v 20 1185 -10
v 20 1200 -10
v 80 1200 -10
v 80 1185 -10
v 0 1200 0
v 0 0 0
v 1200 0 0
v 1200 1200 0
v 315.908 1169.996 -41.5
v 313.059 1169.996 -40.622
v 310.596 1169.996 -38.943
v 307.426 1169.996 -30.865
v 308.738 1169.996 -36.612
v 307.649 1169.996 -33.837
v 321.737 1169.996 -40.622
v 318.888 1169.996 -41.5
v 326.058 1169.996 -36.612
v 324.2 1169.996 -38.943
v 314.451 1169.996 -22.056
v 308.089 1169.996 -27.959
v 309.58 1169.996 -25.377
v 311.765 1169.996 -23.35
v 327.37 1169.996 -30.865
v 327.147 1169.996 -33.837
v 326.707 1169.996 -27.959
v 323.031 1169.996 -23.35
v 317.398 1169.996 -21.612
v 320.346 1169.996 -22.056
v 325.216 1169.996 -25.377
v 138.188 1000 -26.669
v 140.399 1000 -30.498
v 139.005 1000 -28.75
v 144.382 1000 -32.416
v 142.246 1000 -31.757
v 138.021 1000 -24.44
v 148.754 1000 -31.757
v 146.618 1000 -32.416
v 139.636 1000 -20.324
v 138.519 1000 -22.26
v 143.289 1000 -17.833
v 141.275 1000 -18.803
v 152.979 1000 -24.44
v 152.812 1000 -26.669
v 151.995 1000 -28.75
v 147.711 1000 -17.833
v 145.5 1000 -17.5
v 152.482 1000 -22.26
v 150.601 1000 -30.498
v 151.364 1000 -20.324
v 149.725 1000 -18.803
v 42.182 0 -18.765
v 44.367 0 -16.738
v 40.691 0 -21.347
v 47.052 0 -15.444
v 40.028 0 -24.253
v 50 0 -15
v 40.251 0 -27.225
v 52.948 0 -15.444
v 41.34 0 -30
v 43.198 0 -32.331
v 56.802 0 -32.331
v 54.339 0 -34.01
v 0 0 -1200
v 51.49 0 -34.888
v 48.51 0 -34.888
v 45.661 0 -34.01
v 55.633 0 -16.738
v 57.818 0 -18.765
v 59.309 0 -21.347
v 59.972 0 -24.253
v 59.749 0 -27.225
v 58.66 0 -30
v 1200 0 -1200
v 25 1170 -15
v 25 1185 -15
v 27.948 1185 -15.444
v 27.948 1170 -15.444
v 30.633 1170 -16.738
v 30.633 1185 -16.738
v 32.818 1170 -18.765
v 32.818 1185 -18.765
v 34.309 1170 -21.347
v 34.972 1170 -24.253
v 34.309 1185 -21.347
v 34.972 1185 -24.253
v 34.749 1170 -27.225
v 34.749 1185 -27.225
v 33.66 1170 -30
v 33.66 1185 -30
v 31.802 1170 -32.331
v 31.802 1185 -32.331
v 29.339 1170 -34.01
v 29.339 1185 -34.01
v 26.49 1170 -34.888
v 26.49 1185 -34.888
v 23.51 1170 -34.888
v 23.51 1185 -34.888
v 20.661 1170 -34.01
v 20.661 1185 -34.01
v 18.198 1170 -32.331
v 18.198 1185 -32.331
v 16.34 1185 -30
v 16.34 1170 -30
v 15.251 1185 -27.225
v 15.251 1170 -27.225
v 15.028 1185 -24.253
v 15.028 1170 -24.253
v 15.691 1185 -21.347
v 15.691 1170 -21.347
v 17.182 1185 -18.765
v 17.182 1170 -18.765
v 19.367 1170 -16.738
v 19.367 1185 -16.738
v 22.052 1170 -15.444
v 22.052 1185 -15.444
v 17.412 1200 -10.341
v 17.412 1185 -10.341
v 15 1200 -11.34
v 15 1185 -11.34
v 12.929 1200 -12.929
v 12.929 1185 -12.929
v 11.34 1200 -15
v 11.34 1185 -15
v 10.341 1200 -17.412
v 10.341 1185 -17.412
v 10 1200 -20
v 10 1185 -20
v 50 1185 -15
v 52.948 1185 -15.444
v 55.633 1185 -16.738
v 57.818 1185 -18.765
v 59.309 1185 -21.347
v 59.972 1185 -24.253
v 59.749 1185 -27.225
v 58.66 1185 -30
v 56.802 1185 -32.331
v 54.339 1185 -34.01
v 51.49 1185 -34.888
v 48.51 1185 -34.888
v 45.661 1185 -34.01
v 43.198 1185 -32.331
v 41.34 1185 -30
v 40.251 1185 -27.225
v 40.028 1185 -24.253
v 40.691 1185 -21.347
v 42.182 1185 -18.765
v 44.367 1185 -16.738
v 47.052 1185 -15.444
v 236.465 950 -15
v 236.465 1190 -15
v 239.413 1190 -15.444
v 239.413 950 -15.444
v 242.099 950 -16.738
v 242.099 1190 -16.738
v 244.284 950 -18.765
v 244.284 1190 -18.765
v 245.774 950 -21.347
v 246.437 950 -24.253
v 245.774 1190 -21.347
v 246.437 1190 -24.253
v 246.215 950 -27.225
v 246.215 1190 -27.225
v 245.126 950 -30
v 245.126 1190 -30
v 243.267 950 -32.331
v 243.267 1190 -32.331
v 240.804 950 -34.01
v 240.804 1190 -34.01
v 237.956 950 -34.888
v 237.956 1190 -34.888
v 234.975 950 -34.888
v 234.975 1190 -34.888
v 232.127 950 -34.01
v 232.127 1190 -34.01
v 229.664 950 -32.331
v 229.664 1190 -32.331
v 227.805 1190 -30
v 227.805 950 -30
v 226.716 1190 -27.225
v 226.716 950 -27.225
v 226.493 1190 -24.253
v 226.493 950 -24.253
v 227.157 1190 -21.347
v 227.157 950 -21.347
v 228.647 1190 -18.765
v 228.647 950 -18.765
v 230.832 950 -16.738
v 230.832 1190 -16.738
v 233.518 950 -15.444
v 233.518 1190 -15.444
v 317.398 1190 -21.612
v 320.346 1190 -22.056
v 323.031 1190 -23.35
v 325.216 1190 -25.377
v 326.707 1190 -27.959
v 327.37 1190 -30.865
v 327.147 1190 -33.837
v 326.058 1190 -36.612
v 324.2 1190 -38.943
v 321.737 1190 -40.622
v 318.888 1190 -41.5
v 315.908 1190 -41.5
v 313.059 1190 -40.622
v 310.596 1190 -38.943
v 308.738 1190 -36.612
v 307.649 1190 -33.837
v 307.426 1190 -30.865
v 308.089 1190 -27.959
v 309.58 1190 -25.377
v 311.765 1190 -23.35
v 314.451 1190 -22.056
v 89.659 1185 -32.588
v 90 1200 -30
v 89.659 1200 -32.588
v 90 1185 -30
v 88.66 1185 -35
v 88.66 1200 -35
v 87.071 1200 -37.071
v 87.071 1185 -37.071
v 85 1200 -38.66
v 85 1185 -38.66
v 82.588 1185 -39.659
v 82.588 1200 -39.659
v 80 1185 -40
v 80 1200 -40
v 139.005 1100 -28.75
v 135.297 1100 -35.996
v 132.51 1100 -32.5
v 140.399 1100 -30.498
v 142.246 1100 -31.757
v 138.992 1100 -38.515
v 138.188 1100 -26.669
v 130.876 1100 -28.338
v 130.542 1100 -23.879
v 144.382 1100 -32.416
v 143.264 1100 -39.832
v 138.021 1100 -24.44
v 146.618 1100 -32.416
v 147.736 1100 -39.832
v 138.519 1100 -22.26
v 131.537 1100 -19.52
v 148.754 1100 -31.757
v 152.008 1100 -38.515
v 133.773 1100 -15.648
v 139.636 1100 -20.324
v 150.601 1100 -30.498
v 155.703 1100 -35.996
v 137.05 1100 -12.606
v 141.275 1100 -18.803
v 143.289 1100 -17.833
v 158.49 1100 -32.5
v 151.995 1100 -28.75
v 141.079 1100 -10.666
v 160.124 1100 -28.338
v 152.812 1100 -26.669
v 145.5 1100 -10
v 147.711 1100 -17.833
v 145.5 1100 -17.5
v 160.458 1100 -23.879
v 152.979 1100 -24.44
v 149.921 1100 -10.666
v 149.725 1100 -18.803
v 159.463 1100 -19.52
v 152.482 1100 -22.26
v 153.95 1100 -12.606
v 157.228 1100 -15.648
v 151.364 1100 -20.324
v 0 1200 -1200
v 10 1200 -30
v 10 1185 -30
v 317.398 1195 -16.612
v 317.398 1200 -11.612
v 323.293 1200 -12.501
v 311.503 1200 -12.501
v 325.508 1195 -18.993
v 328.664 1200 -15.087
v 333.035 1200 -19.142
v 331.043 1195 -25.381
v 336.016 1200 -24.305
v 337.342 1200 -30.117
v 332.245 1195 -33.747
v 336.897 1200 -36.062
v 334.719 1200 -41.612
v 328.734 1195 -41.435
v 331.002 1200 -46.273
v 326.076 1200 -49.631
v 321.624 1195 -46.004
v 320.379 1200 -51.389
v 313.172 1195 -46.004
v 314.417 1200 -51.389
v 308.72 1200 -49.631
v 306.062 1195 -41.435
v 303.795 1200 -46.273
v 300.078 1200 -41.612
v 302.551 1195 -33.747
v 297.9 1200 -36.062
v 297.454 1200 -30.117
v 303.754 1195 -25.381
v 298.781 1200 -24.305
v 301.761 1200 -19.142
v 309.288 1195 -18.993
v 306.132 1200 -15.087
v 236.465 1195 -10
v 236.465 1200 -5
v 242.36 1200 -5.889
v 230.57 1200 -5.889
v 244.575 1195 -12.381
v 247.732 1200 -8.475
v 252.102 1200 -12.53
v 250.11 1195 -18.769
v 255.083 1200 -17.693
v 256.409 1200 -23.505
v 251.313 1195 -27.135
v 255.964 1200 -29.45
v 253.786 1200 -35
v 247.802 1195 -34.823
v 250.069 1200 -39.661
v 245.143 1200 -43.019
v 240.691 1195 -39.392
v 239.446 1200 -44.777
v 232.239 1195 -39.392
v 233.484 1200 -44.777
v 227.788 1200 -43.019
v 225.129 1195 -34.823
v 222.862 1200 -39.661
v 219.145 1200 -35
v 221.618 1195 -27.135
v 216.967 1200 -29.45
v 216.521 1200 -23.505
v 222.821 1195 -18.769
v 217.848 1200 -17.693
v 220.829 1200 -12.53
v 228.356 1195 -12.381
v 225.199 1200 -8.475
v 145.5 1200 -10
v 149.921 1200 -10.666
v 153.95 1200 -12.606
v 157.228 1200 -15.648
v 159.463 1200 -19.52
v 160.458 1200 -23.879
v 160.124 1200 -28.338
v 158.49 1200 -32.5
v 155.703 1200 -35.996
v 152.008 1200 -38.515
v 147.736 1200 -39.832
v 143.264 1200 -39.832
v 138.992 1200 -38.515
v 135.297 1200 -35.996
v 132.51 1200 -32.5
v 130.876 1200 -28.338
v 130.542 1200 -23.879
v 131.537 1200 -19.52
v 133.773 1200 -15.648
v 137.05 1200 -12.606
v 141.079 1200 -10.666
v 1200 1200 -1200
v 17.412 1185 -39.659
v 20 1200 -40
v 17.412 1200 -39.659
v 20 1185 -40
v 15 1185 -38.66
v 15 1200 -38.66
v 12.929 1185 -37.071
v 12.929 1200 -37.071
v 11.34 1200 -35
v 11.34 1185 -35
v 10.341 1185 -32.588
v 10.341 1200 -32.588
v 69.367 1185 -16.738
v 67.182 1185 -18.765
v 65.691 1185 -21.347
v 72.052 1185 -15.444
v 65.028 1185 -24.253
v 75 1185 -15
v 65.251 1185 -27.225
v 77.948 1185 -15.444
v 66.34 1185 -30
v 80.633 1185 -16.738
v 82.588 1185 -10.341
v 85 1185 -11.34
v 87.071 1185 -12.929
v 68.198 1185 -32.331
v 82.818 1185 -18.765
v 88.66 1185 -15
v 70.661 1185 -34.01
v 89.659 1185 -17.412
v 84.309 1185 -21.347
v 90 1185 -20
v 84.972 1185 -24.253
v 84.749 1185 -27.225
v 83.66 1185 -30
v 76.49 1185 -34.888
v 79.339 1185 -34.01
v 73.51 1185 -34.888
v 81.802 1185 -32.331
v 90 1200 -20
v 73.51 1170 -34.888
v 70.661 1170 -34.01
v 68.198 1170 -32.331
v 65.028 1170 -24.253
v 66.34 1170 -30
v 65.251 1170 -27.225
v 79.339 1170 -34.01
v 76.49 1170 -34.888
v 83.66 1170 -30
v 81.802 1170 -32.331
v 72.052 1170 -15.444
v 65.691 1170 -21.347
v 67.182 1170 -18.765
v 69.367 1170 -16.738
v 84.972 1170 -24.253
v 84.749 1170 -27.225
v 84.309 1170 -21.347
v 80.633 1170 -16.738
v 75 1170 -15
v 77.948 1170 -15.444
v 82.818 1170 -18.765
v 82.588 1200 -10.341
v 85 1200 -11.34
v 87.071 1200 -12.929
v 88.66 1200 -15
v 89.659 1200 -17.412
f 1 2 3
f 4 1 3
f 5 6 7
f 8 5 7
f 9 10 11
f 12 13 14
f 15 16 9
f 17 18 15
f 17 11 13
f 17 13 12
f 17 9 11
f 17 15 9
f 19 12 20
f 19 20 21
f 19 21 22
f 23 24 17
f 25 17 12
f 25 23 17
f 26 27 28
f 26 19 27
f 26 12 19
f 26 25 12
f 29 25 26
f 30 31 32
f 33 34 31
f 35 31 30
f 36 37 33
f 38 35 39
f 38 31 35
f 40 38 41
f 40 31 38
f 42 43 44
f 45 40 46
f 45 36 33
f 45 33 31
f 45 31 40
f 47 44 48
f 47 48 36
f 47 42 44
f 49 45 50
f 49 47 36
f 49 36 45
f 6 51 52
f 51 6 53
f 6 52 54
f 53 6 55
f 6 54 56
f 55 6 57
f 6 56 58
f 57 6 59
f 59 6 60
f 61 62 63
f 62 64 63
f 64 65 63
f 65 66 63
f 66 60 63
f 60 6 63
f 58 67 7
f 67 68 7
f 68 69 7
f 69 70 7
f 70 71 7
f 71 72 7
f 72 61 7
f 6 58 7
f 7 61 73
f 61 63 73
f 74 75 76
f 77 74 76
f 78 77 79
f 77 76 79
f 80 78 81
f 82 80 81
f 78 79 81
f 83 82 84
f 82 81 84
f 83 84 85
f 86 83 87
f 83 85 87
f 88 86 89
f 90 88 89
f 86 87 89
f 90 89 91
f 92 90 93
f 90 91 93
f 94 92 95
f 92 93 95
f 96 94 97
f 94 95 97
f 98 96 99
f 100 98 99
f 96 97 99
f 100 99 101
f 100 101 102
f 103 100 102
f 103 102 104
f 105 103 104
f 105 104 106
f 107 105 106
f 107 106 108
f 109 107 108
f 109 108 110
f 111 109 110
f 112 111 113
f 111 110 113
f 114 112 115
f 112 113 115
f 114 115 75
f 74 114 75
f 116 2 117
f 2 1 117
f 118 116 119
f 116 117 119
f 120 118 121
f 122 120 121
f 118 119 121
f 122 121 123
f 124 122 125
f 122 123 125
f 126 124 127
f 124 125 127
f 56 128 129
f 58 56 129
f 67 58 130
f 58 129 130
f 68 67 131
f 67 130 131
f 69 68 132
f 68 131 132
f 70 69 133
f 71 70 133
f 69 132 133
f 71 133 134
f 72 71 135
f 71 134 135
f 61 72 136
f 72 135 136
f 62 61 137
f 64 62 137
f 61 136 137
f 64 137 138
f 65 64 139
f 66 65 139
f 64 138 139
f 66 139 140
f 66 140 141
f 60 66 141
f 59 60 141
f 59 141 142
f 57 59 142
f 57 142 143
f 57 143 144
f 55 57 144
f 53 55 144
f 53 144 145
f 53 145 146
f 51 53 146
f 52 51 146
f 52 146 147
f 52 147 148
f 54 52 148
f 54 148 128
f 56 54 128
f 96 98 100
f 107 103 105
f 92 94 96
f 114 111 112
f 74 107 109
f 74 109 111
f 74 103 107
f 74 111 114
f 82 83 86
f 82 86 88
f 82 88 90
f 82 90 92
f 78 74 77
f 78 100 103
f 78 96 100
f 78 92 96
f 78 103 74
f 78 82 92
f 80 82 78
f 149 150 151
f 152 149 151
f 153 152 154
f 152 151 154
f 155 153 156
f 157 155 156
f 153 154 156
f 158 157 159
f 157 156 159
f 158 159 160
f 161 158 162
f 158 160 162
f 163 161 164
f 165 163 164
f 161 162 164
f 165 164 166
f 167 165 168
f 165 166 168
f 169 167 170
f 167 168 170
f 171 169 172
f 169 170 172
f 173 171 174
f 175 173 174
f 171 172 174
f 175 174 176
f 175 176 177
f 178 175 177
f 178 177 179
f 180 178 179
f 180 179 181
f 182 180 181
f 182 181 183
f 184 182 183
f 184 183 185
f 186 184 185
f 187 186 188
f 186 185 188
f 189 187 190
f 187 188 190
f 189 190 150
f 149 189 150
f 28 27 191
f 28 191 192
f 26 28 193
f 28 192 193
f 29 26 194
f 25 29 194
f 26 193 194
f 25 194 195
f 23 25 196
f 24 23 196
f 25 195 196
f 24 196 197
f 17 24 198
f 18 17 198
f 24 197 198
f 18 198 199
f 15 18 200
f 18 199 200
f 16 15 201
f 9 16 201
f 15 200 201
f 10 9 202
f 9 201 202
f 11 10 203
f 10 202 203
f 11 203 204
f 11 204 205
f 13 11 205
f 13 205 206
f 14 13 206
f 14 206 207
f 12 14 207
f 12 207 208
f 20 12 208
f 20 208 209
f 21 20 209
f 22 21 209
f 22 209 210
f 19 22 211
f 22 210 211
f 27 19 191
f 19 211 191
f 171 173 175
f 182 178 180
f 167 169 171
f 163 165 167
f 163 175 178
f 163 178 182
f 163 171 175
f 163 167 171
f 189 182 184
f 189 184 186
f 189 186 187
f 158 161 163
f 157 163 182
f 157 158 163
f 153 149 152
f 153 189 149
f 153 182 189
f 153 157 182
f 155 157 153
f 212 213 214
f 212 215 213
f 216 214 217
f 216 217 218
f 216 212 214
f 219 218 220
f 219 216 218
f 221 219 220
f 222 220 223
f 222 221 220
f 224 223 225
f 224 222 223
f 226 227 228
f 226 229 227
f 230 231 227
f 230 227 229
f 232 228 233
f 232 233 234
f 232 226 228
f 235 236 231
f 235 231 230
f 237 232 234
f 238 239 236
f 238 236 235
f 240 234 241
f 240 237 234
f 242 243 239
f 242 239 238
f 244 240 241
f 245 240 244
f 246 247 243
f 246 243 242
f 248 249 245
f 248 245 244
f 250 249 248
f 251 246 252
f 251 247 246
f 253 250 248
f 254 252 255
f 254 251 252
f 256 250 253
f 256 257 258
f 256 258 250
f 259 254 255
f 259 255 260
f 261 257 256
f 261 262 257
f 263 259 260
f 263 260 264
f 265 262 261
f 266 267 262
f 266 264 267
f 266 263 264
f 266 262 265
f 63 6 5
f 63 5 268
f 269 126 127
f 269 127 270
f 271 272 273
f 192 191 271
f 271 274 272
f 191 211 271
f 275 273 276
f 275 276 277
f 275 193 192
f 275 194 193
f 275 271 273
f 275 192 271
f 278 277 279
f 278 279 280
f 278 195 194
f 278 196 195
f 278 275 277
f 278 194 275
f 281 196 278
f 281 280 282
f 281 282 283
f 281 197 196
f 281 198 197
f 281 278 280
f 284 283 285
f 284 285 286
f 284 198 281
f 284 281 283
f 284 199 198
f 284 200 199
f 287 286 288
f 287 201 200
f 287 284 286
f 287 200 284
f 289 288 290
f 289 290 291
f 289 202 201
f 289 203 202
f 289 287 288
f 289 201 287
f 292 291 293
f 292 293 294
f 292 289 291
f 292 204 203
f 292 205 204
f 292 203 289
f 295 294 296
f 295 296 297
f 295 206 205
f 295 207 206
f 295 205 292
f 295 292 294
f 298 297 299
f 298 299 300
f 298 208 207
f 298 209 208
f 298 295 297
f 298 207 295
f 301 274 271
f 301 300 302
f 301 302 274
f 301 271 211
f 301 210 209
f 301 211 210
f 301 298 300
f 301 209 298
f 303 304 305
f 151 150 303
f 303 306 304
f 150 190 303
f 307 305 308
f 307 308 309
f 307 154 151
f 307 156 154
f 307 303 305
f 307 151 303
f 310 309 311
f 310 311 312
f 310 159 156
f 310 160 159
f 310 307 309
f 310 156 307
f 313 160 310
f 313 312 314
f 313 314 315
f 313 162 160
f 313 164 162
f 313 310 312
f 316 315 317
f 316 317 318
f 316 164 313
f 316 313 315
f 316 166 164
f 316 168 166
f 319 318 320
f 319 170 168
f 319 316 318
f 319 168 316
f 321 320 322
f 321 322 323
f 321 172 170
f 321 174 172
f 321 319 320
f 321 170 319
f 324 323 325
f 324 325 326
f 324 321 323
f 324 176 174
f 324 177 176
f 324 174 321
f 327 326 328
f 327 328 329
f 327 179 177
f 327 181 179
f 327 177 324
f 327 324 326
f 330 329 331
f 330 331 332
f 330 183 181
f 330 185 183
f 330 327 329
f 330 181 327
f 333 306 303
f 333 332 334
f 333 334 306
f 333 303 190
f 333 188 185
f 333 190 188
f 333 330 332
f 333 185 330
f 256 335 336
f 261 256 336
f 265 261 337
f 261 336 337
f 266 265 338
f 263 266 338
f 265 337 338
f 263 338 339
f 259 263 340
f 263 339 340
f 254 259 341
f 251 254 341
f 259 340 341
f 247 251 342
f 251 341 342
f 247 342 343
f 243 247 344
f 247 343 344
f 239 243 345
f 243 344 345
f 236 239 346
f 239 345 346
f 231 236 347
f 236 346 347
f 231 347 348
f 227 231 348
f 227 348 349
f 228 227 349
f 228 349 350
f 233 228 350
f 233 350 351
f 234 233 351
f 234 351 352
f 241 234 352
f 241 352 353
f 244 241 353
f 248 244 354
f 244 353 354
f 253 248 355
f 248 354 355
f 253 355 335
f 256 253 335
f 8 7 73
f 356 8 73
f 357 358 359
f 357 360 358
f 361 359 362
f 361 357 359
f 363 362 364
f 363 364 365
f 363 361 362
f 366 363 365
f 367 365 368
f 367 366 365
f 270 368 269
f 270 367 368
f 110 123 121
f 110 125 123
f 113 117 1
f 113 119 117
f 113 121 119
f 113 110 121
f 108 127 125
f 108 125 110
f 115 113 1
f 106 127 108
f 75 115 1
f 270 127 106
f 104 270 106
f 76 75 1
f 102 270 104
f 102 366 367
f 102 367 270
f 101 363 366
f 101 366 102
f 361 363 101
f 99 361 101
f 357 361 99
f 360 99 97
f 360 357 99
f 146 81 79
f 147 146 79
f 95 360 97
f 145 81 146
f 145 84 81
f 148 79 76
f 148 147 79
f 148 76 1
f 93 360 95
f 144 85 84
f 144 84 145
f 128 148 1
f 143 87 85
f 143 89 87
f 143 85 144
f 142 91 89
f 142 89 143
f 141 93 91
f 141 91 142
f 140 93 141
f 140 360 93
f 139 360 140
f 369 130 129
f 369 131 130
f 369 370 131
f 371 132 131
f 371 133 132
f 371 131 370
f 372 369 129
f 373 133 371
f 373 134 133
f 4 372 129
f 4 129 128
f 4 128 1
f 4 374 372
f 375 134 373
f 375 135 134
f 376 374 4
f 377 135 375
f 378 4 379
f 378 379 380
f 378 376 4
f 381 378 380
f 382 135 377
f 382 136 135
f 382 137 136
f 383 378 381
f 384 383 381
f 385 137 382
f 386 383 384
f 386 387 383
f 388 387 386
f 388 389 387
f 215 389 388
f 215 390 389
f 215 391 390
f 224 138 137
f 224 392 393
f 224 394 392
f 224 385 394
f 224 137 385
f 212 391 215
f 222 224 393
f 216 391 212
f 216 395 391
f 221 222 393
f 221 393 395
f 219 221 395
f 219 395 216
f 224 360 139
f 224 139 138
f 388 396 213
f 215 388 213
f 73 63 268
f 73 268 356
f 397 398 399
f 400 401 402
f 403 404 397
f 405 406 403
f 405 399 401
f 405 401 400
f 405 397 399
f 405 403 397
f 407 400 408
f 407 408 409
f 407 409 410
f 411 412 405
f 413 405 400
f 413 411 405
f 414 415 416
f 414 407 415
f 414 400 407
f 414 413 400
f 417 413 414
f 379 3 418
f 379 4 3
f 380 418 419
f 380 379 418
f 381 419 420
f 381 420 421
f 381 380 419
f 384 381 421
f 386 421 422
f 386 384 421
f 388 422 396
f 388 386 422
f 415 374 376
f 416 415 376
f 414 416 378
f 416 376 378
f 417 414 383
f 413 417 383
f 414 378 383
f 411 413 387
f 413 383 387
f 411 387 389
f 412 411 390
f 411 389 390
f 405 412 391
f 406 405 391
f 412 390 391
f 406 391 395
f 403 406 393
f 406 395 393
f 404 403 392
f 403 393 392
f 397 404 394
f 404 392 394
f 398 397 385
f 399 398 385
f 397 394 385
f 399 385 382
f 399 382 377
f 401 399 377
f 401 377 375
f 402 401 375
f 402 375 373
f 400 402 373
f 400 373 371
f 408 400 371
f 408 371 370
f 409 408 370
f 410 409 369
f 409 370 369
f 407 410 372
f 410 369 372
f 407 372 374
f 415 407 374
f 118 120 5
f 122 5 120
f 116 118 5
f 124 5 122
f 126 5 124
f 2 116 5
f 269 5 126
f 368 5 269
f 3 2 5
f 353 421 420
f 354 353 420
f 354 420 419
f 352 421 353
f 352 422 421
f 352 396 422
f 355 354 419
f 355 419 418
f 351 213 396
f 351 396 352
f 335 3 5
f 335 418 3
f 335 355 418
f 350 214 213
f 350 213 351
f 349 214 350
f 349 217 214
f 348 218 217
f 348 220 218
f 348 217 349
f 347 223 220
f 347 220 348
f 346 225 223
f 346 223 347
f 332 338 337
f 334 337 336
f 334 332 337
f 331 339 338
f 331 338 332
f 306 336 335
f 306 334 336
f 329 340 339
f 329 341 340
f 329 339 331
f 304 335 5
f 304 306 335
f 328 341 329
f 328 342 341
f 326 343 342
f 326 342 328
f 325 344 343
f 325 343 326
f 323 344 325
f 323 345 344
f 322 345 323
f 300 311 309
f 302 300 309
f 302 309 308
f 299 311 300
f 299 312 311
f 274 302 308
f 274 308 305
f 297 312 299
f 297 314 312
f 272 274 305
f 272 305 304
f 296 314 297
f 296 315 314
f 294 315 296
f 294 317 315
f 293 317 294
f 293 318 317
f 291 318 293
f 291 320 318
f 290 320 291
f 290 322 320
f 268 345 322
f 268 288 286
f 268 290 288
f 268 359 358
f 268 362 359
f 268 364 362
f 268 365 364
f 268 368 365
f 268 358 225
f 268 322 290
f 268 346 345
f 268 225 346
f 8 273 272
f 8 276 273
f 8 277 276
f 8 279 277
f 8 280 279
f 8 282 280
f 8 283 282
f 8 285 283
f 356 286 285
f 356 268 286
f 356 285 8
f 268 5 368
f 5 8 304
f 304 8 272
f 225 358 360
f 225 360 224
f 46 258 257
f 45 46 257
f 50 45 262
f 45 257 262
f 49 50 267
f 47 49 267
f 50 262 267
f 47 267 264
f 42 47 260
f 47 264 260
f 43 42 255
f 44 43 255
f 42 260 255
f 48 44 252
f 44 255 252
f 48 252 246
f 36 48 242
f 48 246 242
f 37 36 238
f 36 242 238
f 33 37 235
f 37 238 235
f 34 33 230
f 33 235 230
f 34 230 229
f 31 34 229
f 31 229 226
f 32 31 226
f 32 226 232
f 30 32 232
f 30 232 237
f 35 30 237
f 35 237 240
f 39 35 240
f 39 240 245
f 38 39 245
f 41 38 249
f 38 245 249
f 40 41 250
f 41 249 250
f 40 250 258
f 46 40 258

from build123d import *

# Parameters (mm, degrees)
SKETCH1_W           = 1200
SKETCH1_H           = 1200
BOSS_EXTRUDE1_DEPTH = 1200
SKETCH3_W           = 80
SKETCH3_H           = 30
CUT_EXTRUDE2_DEPTH  = 15
FILLET1_R           = 10
SKETCH4_R           = 10
CUT_EXTRUDE3_DEPTH  = 15
SKETCH5_R           = 10
CUT_EXTRUDE4_DEPTH  = 2070.8369501
SKETCH6_R           = 15
CUT_EXTRUDE5_DEPTH  = 100
SKETCH8_R           = 7.5
CUT_EXTRUDE6_DEPTH  = 100
SKETCH11_R          = 10
CUT_EXTRUDE7_DEPTH  = 250
CHAMFER1_SIZE       = 10
SKETCH12_R          = 10
CUT_EXTRUDE8_DEPTH  = 30.004
CHAMFER2_SIZE       = 10


with BuildPart() as part:
    # Sketch1 → Boss-Extrude1 (new body)
    with BuildSketch(Plane(origin=(0, 0, 0), x_dir=(1, 0, 0), z_dir=(0, 1, 0))):
        with Locations((600, 600)):
            Rectangle(SKETCH1_W, SKETCH1_H)
    extrude(amount=BOSS_EXTRUDE1_DEPTH)

    # Sketch3 → Cut-Extrude2 (cut)
    with BuildSketch(Plane(origin=(0, 1200, 0), x_dir=(1, 0, 0), z_dir=(0, 1, 0))):
        with Locations((50, 25)):
            Rectangle(SKETCH3_W, SKETCH3_H)
    extrude(amount=-CUT_EXTRUDE2_DEPTH, mode=Mode.SUBTRACT)

    # Fillet1
    fillet1_edges = [part.edges().sort_by_distance(p)[0] for p in [
        (10, 1192.5, -10),
        (10, 1192.5, -40),
        (90, 1192.5, -40),
        (90, 1192.5, -10),
    ]]
    fillet(fillet1_edges, radius=FILLET1_R)

    # Sketch4 → Cut-Extrude3 (cut)
    with BuildSketch(Plane(origin=(0, 1185, 0), x_dir=(1, 0, 0), z_dir=(0, 1, 0))):
        with Locations(Location((25, 25, 0), (0, 0, 270))):
            Circle(SKETCH4_R)
        with Locations(Location((75, 25, 0), (0, 0, 270))):
            Circle(SKETCH4_R)
    extrude(amount=-CUT_EXTRUDE3_DEPTH, mode=Mode.SUBTRACT)

    # Sketch5 → Cut-Extrude4 (cut, through all)
    with BuildSketch(Plane(origin=(0, 1185, 0), x_dir=(1, 0, 0), z_dir=(0, 1, 0))):
        with Locations(Location((50, 25, 0), (0, 0, 270))):
            Circle(SKETCH5_R)
    extrude(amount=-CUT_EXTRUDE4_DEPTH, mode=Mode.SUBTRACT)

    # Sketch6 → Cut-Extrude5 (cut)
    with BuildSketch(Plane(origin=(0, 1200, 0), x_dir=(1, 0, 0), z_dir=(0, 1, 0))):
        with Locations(Location((145.500055777, 25, 0), (0, 0, 270))):
            Circle(SKETCH6_R)
    extrude(amount=-CUT_EXTRUDE5_DEPTH, mode=Mode.SUBTRACT)

    # Sketch8 → Cut-Extrude6 (cut)
    with BuildSketch(Plane(origin=(0, 1100, 0), x_dir=(1, 0, 0), z_dir=(0, 1, 0))):
        with Locations(Location((145.500055777, 25, 0), (0, 0, 270))):
            Circle(SKETCH8_R)
    extrude(amount=-CUT_EXTRUDE6_DEPTH, mode=Mode.SUBTRACT)

    # Sketch11 → Cut-Extrude7 (cut)
    with BuildSketch(Plane(origin=(0, 1200, 0), x_dir=(1, 0, 0), z_dir=(0, 1, 0))):
        with Locations(Location((236.465344037, 25, 0), (0, 0, 270))):
            Circle(SKETCH11_R)
    extrude(amount=-CUT_EXTRUDE7_DEPTH, mode=Mode.SUBTRACT)

    # Chamfer1
    chamfer1_edges = [part.edges().sort_by_distance(p)[0] for p in [
        (236.465344037, 1200, -35),
    ]]
    chamfer(chamfer1_edges, length=CHAMFER1_SIZE)

    # Sketch12 → Cut-Extrude8 (cut)
    with BuildSketch(Plane(origin=(0, 1200, 0), x_dir=(1, 0, 0), z_dir=(0, 1, 0))):
        with Locations(Location((317.39806053, 31.612058329, 0), (0, 0, 270))):
            Circle(SKETCH12_R)
    extrude(amount=-CUT_EXTRUDE8_DEPTH, mode=Mode.SUBTRACT)

    # Chamfer2
    chamfer2_edges = [part.edges().sort_by_distance(p)[0] for p in [
        (317.39806053, 1200, -41.612058329),
    ]]
    chamfer(chamfer2_edges, length=CHAMFER2_SIZE)


solid = part.part
